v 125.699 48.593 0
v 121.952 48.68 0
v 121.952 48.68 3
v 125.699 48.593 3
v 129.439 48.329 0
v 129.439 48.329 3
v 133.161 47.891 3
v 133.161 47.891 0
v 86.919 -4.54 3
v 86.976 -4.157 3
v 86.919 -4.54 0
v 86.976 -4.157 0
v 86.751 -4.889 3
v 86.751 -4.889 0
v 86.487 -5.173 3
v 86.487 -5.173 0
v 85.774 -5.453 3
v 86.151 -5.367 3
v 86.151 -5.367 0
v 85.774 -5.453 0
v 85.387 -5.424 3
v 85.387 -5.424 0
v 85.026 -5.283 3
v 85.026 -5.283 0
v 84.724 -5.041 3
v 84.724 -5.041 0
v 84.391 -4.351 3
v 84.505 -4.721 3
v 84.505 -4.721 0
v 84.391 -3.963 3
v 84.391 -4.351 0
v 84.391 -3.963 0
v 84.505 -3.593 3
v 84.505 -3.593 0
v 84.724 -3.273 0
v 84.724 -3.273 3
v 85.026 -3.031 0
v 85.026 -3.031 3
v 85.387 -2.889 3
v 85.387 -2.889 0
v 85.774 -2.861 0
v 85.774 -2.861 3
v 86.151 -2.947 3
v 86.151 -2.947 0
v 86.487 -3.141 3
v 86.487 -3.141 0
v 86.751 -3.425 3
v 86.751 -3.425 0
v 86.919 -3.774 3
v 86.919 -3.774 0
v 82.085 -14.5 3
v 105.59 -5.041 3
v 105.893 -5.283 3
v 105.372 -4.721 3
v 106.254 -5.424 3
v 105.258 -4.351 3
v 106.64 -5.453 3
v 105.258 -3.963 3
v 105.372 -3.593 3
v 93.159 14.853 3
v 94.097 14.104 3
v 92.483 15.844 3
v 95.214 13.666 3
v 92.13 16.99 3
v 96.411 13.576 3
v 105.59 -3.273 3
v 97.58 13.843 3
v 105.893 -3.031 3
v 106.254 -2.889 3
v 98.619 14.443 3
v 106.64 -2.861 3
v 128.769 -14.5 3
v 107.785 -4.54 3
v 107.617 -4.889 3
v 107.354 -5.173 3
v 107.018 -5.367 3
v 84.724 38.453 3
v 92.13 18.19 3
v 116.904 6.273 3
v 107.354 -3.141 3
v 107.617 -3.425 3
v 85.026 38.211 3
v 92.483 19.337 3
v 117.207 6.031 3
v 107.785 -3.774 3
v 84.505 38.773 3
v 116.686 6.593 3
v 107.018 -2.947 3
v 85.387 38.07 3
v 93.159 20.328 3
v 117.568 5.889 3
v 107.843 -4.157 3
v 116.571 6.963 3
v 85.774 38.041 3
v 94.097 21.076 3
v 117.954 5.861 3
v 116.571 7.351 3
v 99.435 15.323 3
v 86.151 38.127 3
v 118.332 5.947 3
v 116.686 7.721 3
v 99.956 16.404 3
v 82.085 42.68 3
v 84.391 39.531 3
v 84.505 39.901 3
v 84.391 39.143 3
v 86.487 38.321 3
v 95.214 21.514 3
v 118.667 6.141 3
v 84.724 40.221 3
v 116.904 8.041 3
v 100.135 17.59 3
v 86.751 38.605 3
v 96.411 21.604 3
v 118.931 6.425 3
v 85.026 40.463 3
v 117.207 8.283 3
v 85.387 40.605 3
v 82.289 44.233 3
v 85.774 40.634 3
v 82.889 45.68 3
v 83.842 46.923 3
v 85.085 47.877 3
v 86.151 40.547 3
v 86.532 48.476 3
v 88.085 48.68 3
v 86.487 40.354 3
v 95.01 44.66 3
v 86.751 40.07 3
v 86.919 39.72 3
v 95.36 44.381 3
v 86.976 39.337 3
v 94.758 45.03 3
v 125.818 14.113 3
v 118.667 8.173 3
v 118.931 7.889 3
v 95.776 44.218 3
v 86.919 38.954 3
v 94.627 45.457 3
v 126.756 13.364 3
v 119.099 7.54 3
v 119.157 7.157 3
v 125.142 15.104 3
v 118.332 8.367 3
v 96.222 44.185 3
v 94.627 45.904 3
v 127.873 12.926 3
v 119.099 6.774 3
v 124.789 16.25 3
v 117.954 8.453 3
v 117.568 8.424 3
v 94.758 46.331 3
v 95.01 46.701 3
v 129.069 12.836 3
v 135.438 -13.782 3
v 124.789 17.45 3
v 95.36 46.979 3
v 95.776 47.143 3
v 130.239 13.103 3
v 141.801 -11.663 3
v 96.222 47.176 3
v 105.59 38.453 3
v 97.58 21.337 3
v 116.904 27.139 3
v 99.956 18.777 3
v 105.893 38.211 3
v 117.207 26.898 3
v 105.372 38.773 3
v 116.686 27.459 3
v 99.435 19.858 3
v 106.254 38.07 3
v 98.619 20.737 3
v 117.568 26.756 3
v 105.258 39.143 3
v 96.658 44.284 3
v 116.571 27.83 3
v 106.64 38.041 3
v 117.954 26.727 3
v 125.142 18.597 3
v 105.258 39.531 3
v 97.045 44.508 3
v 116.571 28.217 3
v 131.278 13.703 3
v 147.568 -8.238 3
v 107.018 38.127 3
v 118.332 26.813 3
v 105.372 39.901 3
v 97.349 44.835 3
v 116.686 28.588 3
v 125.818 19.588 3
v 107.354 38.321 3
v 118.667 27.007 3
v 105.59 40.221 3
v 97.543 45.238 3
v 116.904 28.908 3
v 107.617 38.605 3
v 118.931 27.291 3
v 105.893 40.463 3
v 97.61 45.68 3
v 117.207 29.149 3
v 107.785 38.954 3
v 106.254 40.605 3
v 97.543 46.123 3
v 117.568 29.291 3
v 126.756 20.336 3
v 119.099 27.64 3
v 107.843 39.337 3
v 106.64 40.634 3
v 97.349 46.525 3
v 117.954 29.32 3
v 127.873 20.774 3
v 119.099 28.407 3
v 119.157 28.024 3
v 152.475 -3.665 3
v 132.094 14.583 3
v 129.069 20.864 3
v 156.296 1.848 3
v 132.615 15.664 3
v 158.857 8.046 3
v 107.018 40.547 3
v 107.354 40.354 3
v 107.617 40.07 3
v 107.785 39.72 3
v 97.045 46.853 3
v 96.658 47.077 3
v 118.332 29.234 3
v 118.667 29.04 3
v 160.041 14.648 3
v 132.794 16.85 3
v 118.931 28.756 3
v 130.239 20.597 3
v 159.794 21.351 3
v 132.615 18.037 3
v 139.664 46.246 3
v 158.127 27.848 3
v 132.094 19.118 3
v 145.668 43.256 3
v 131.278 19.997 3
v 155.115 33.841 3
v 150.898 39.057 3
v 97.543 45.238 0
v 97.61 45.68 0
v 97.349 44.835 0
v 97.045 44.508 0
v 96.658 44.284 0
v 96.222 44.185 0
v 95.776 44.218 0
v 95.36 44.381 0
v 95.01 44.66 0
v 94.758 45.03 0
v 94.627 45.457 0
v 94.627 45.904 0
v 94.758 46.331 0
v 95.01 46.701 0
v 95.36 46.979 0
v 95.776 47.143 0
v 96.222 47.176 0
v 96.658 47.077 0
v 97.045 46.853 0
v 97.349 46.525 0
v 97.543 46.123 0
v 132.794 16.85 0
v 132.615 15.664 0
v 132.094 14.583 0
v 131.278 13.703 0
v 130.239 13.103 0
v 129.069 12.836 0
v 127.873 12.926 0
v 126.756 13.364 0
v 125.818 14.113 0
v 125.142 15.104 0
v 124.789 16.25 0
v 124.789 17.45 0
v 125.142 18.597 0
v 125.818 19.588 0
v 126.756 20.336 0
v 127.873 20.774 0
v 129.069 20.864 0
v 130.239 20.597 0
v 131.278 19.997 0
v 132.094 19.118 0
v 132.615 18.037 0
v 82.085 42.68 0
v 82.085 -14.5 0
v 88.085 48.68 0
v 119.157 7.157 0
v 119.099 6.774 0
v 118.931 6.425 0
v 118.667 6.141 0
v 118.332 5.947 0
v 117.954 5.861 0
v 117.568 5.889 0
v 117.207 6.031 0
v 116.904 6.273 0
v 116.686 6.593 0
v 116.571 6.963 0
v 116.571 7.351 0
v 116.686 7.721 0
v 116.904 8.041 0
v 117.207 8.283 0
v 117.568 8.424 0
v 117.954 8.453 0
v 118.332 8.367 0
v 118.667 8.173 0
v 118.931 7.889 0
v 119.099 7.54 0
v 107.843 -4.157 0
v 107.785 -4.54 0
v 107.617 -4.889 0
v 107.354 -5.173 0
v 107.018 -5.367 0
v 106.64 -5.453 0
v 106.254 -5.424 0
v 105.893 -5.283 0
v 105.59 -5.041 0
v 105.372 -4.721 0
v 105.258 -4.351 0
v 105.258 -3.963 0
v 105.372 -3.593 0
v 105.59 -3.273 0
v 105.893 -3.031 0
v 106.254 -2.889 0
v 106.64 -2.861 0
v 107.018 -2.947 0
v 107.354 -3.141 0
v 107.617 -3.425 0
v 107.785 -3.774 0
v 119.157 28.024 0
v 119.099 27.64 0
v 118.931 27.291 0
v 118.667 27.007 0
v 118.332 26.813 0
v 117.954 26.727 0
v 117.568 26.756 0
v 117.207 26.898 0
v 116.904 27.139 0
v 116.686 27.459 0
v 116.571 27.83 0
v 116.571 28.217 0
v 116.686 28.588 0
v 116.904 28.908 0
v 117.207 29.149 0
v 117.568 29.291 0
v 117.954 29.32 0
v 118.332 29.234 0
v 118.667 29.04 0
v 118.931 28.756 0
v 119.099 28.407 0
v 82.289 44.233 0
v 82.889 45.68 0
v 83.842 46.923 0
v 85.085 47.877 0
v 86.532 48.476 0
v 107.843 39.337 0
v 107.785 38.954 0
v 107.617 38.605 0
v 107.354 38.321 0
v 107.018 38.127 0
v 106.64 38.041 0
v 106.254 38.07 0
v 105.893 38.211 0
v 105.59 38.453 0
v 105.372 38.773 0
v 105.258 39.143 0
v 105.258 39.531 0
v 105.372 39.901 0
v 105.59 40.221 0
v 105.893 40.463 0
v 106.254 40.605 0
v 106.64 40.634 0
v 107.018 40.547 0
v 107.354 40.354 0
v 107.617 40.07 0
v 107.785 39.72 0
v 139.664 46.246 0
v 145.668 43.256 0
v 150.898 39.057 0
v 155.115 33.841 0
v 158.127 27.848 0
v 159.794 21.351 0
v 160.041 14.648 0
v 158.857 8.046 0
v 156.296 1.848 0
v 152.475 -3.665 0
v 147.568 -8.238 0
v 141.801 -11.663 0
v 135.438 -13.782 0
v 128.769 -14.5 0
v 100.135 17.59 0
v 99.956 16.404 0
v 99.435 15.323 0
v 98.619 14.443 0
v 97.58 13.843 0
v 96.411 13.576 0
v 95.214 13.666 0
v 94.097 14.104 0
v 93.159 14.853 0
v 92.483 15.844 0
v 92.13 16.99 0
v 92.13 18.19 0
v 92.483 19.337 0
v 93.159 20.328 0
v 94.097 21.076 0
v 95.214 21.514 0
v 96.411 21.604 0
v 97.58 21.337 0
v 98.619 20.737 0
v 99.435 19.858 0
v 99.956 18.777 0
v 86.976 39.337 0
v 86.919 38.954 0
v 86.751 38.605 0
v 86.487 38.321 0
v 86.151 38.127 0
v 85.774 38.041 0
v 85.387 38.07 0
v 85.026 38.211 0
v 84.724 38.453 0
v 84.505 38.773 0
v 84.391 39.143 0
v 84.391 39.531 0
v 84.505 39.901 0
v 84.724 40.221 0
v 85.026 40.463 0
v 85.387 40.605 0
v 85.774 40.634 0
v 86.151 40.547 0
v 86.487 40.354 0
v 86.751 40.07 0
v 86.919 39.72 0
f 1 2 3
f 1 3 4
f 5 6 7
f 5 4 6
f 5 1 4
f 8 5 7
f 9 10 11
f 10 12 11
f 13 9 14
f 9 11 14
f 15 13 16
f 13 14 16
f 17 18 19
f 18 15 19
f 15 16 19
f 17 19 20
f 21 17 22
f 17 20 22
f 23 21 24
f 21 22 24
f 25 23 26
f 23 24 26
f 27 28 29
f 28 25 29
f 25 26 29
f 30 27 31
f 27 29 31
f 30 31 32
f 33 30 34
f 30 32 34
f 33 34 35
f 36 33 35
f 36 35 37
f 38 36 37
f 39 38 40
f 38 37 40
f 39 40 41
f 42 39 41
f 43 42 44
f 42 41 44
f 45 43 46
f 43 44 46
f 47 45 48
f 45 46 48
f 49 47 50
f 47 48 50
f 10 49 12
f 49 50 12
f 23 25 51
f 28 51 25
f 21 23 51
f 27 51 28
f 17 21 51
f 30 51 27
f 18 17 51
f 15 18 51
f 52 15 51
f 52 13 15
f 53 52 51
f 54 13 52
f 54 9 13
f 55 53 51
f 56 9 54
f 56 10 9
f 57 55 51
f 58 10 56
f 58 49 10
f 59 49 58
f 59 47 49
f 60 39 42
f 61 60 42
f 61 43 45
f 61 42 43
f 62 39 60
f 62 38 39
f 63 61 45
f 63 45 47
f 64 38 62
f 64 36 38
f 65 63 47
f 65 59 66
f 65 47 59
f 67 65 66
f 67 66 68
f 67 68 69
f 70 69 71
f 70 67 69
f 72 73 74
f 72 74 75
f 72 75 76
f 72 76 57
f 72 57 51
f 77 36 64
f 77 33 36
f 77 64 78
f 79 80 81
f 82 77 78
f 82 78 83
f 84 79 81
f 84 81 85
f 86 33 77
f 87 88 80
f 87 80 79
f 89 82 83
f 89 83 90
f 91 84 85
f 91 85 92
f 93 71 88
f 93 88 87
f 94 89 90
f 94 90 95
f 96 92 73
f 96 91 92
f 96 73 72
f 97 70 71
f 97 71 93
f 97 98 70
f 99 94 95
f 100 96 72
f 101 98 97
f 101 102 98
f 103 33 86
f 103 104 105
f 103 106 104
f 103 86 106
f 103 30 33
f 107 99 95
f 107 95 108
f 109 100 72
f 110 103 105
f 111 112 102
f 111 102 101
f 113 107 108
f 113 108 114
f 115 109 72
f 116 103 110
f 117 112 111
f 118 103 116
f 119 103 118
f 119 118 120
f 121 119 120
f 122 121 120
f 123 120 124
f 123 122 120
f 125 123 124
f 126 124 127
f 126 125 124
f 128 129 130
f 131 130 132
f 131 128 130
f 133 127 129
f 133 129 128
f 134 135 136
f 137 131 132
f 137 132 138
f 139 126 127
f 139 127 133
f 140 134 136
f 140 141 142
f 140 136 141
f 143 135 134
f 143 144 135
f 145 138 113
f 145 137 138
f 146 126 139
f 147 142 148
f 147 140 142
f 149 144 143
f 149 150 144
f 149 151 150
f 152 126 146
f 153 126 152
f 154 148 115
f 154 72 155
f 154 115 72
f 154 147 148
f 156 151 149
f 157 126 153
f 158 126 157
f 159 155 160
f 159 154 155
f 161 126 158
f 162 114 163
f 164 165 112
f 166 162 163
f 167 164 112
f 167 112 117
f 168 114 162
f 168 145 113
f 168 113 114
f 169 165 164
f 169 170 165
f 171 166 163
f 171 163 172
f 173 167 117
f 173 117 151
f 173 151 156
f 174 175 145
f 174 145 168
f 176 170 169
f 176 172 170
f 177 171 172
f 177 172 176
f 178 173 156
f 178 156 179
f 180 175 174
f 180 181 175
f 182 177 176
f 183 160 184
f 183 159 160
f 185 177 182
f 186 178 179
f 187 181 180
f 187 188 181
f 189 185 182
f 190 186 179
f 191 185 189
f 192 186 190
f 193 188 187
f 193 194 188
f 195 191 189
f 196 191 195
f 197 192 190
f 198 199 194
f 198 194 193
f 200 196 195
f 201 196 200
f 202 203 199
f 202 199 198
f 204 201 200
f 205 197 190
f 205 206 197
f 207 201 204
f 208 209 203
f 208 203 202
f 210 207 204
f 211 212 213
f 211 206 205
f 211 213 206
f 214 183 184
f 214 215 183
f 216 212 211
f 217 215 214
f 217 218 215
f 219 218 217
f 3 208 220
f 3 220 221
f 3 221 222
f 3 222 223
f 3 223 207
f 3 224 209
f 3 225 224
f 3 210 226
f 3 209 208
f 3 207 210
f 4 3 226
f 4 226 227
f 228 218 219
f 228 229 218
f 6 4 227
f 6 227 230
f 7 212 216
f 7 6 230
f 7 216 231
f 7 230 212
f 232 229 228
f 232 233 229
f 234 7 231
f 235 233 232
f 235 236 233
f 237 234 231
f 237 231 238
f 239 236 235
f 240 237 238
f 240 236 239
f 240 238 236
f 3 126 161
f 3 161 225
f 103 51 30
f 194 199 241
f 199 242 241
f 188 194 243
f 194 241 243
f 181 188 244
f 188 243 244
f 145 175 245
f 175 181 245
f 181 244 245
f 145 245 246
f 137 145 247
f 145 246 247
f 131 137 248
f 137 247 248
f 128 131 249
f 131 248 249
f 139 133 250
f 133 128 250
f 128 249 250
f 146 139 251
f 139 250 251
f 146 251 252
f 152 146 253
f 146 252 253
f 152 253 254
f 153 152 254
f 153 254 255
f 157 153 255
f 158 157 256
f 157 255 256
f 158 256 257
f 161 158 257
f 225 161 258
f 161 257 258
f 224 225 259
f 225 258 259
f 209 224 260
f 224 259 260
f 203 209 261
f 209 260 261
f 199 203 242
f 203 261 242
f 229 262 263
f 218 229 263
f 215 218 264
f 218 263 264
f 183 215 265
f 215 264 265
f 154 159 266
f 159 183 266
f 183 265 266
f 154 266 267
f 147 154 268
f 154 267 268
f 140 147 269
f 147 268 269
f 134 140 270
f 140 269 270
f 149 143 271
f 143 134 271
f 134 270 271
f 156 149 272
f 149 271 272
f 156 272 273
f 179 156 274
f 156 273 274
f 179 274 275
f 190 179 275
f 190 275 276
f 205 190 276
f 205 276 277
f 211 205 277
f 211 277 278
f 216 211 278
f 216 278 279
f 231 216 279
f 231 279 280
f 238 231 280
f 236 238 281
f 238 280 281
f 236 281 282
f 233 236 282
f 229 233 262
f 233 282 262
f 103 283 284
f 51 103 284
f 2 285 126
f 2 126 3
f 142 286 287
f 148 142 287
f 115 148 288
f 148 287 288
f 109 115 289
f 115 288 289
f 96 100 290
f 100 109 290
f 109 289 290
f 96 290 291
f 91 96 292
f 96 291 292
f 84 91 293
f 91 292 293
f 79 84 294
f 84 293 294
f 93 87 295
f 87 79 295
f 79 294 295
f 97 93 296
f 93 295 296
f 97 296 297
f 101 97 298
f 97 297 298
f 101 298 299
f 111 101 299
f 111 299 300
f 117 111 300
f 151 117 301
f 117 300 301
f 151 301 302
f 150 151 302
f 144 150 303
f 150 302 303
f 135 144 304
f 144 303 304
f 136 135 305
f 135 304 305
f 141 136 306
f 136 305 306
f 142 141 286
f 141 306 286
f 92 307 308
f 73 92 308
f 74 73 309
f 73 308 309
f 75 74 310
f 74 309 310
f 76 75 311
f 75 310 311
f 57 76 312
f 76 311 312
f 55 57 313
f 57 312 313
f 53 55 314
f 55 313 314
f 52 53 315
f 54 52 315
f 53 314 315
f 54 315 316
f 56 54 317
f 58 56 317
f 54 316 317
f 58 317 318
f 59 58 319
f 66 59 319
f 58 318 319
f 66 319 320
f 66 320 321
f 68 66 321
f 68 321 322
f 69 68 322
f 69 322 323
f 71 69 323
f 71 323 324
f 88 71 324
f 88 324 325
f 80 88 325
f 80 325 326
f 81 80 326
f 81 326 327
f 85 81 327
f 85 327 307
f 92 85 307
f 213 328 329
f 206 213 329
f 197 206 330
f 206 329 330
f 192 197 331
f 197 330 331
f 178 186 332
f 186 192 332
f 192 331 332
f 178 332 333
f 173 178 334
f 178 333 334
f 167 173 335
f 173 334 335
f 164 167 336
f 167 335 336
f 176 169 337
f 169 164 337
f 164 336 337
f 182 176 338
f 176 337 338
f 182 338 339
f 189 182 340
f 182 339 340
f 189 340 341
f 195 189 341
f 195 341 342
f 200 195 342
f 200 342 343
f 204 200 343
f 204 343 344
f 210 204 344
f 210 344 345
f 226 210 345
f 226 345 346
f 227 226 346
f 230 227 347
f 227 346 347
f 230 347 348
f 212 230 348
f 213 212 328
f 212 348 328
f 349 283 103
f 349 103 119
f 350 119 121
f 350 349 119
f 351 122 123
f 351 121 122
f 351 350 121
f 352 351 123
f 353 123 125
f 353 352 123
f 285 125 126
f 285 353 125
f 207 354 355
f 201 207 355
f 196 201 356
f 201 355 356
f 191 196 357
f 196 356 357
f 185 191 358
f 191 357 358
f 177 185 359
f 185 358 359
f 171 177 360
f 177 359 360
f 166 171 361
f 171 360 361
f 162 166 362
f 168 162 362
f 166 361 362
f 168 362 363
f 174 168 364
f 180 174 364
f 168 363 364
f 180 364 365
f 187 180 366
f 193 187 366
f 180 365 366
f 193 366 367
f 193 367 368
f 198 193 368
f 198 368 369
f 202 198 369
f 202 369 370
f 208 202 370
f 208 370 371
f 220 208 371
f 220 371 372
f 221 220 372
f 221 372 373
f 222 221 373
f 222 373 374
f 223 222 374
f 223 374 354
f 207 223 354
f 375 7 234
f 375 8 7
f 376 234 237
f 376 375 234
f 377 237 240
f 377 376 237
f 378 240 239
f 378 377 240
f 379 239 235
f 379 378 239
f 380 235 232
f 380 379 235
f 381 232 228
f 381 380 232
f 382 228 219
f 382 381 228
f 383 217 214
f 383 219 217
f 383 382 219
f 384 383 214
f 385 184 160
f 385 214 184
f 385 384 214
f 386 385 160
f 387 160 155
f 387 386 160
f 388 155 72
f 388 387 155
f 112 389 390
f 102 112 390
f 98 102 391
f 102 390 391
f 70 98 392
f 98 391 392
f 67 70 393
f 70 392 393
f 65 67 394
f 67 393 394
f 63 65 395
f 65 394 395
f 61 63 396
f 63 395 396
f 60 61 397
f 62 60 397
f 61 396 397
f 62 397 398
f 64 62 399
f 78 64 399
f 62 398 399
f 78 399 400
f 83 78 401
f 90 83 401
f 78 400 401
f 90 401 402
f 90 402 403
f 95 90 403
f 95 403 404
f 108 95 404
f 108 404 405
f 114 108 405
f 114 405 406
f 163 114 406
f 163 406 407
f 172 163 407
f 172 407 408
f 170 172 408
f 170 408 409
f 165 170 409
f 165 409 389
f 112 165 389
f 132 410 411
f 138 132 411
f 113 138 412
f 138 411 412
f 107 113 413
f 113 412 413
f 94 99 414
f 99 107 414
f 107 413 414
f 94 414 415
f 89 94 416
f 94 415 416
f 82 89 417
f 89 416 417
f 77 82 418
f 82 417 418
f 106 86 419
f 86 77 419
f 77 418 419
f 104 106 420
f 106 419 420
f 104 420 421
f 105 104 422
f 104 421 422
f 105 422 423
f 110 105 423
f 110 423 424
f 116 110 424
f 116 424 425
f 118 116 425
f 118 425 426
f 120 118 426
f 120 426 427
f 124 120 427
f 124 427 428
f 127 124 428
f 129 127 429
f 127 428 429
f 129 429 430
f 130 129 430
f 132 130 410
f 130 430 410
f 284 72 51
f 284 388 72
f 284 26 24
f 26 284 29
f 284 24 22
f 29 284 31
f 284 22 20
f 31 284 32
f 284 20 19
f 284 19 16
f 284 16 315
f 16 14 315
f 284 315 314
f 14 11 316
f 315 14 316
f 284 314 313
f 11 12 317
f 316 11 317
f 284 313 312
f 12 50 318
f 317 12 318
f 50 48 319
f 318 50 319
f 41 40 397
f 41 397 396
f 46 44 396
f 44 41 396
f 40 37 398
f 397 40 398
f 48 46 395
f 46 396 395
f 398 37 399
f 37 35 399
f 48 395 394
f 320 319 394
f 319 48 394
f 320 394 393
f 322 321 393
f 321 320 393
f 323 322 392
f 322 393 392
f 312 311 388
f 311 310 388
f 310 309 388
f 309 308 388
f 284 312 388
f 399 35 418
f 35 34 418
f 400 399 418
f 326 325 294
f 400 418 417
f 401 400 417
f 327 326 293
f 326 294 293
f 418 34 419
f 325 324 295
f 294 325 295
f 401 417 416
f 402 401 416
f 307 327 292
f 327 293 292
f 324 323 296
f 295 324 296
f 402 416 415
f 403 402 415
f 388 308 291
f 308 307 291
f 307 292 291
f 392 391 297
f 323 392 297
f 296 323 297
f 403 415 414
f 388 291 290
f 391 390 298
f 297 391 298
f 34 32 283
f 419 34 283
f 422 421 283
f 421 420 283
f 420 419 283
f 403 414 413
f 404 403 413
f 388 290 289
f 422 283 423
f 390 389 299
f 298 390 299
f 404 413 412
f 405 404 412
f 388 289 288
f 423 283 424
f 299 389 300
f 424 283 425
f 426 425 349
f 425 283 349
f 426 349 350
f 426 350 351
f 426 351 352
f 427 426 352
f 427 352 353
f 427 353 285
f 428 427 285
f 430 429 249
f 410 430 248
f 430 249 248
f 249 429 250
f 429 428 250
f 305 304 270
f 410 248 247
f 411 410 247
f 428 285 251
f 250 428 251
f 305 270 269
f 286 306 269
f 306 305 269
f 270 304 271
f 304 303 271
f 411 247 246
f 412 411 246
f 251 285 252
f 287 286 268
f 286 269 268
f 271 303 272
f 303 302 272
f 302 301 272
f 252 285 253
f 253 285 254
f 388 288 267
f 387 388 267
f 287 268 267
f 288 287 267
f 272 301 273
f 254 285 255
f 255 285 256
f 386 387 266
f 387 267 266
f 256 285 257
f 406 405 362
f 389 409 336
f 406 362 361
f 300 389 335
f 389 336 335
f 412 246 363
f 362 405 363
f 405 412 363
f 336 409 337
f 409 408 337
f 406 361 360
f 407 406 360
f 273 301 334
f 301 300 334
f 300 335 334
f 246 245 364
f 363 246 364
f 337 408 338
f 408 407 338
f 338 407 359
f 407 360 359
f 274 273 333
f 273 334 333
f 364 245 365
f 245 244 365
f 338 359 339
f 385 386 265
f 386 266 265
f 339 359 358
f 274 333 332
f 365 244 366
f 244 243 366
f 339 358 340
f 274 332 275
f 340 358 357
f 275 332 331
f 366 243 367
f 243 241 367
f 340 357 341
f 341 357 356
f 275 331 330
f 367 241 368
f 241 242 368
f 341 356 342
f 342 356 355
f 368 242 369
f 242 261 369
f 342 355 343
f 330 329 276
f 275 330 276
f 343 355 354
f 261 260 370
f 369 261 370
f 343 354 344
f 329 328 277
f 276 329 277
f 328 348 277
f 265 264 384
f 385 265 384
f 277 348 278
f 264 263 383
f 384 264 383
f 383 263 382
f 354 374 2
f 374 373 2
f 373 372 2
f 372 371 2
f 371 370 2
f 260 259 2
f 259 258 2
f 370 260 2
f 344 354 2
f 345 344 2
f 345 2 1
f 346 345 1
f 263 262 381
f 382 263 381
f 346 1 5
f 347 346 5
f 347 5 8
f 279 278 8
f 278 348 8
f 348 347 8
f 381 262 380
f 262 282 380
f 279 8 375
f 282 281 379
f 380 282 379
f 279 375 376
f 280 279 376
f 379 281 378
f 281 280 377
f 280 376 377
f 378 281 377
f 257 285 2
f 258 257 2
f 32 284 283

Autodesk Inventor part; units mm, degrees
ref_plane "YZ Plane" through (0, 0, 0) normal (1, 0, 0) x (0, 1, 0)
ref_plane "XZ Plane" through (0, 0, 0) normal (0, 1, 0) x (-1, 0, 0)
ref_plane "XY Plane" through (0, 0, 0) normal (0, 0, 1) x (1, 0, 0)
sketch "スケッチ1" plane through (0, 0, 0) normal (0, 0, 1) x (1, 0, 0)
  circle A0 centre (96.1098, 17.5902) radius 9.025 construction
  circle A1 centre (128.7687, 16.8502) radius 6.025 construction
  line L0 (78.0196, 48.6804) -> (110.2, 48.6804) construction
  line L1 (127.2, -14.5) -> (65.0196, -14.5)
  line L2 (65.0196, -14.5) -> (65.0196, 33.6804) construction
  circle A2 centre (96.1098, 17.5902) radius 5.0587 construction
  circle A3 centre (128.7687, 16.8502) radius 29.3819 construction
  circle A4 centre (128.7687, 16.8502) radius 31.3502
  arc A5 (102.5247, 30.0621) -> (101.9533, 4.8405) centre (96.1098, 17.5902) ccw
  line L3 (88.0848, 48.6804) -> (121.9521, 48.6804)
  arc A6 (133.1613, 47.8912) -> (121.9521, 48.6804) centre (121.9521, -31.3196) ccw
  arc A7 (88.0848, 48.6804) -> (82.0848, 42.6804) centre (88.0848, 42.6804) ccw
  line L4 (82.0848, 42.6804) -> (82.0848, -14.5)
  circle A8 centre (96.1098, 17.5902) radius 4.025
  circle A9 centre (128.7687, 16.8502) radius 4.025
  line L5 (127.2, -14.5) -> (128.7687, -14.5)
  circle A10 centre (68.0196, 17.5902) radius 1.5
  circle A11 centre (96.1098, 45.6804) radius 1.5
  circle A12 centre (74.3628, 28.0235) radius 1.3
  circle A13 centre (85.6765, 39.3372) radius 1.3
  circle A14 centre (106.5431, 39.3372) radius 1.3
  circle A15 centre (117.8569, 28.0235) radius 1.3
  circle A16 centre (117.8569, 7.1569) radius 1.3
  circle A17 centre (106.5431, -4.1569) radius 1.3
  circle A18 centre (85.6765, -4.1569) radius 1.3
  circle A19 centre (74.3628, 7.1569) radius 1.3
  point P0 (0, 0)
  point P1 (0, 0)
  point P2 (80.0196, 33.6804)
  dimension "d0" = 5
  dimension "d1" = 80
  dimension "d2" = 6
  dimension "d3" = 8.05
  dimension "d4" = 8.05
  dimension "d7" = 3
  dimension "d8" = 3
  dimension "d9" = 2.6
  dimension "d10" = 16
extrude "押し出し1" add sketch "スケッチ1" along normal blind 3 contours L1 L4 A5 A4 A17 L5 | A4 A17 A8 A14 | L4 A7 L3 A6 A4 A14 A5 | A5 A4 A8
properties part number "外側フレーム" material "アルミニウム 2014-T4"
